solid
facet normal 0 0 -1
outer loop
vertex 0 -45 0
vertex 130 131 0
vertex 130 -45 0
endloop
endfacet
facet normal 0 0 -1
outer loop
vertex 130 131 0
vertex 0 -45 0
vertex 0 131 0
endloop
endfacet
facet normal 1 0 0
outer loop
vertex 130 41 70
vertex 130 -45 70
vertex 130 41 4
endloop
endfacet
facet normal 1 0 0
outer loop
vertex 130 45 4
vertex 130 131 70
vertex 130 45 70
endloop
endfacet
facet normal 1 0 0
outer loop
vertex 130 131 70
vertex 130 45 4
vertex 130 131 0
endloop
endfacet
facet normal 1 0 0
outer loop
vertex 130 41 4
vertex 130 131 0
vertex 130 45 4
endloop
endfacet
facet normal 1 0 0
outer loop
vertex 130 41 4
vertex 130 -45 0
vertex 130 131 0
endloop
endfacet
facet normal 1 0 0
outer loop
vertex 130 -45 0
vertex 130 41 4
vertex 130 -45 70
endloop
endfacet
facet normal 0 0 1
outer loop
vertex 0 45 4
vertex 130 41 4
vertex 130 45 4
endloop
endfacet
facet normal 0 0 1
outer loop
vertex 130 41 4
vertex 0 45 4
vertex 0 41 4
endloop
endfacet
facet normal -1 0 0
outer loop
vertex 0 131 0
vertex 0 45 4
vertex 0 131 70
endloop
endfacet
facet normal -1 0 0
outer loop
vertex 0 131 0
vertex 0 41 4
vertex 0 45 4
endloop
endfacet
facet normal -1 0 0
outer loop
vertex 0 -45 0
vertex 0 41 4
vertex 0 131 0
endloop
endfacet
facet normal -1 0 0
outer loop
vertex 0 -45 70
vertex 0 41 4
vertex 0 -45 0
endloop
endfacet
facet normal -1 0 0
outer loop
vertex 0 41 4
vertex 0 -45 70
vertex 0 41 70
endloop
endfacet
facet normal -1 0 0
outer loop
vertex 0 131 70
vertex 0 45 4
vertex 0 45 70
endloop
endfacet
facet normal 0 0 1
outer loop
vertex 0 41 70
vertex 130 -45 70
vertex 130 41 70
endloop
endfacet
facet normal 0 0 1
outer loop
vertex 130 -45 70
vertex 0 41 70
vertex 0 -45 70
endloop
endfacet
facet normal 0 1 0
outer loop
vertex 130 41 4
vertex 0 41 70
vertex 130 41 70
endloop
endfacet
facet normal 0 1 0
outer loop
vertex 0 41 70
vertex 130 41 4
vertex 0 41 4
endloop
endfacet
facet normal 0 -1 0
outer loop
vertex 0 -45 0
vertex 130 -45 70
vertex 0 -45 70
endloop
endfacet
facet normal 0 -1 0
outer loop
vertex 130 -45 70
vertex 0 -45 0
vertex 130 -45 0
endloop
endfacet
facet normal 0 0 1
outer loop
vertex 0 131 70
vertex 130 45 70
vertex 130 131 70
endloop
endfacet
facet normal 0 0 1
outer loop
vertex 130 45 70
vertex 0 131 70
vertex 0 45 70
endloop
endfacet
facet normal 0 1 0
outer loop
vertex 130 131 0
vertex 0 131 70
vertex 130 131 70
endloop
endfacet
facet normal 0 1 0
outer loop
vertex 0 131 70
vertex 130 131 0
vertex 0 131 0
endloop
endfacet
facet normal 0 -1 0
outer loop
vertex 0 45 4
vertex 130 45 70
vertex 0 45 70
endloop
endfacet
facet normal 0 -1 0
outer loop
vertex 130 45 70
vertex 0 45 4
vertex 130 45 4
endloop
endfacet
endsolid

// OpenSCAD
// Rack for six 50 mL conical (Falcon-type) tubes
// Print orientation: Upside down. Flat plate on bed (Z=0).
// After printing, flip over to stand on the two walls.

// --- Dimensions ---
// Plate dimensions
W_PLATE_X = 130; // mm
W_PLATE_Y = 90;  // mm
H_PLATE = 4;     // mm

// Hole specifications
N_ROWS = 3;      // Rows along X
N_COLS = 2;      // Cols along Y
D_HOLE = 30.5;   // mm (Diameter)
C_X = 40;        // mm (Centre-to-centre spacing X)
C_Y = 40;        // mm (Centre-to-centre spacing Y)

// Wall specifications
H_WALL = 70;     // mm (Total height from bed)
W_WALL_THICK = 4; // mm (Thickness of wall)

// --- Derived Positions ---
// Plate is centred on origin
// Hole grid positions
// Rows along X: 3 holes. Spacing 40mm. Centres at: -40, 0, +40
HOLE_X_POS = [-40, 0, 40];

// Cols along Y: 2 holes. Spacing 40mm.
// Plate Y is 90mm. Half is 45mm.
// We need to fit 2 holes with 40mm spacing symmetrically.
// Distance between holes = 40mm.
// Center of the pair = 0.
// y1 = -20, y2 = +20.
HOLE_Y_POS = [-20, 20];

// Wall positions
// Walls run along the long edges (X direction).
// Plate Y is 90mm. Half is 45mm.
// Wall thickness is 4mm.
// Wall 1 (Left): Extends from Y = -45 to Y = -41
// Wall 2 (Right): Extends from Y = +41 to Y = +45
WALL_Y_MIN = -45;
WALL_Y_MAX = 45;
WALL_Y_INNER = -41;
WALL_Y_OUTER = 41;

// --- Configuration ---
$fn = 128; // High resolution for holes and walls

module main() {
    // Create the base plate
    plate();
    
    // Create the holes by subtracting cylinders from the plate
    // We use difference() here. The plate is the first object.
    // The holes are cylinders centered at the calculated positions.
    // We extend the cylinder height slightly past the plate to ensure clean cuts.
    difference() {
        // 1. The Plate
        translate([0, 0, 0]) {
            cube([W_PLATE_X, W_PLATE_Y, H_PLATE], center = false);
        }
        
        // 2. The Holes
        for (xi = [0:N_ROWS-1]) {
            for (yi = [0:N_COLS-1]) {
                translate([HOLE_X_POS[xi], HOLE_Y_POS[yi], 0]) {
                    cylinder(h = H_PLATE + 0.1, d = D_HOLE, $fn = 128);
                }
            }
        }
    }
    
    // Add the walls
    // Left Wall (from Y=-45 to -41)
    translate([0, WALL_Y_MIN, 0]) {
        cube([W_PLATE_X, WALL_Y_OUTER - WALL_Y_MIN, H_WALL], center = false);
    }
    
    // Right Wall (from Y=+41 to +45)
    translate([0, WALL_Y_MAX, 0]) {
        cube([W_PLATE_X, WALL_Y_MAX - WALL_Y_INNER, H_WALL], center = false);
    }
}

module plate() {
    // This module is now just a helper to visualize the plate if needed,
    // but the main logic is in the difference block above.
    // We keep it simple to avoid confusion.
}

main();
